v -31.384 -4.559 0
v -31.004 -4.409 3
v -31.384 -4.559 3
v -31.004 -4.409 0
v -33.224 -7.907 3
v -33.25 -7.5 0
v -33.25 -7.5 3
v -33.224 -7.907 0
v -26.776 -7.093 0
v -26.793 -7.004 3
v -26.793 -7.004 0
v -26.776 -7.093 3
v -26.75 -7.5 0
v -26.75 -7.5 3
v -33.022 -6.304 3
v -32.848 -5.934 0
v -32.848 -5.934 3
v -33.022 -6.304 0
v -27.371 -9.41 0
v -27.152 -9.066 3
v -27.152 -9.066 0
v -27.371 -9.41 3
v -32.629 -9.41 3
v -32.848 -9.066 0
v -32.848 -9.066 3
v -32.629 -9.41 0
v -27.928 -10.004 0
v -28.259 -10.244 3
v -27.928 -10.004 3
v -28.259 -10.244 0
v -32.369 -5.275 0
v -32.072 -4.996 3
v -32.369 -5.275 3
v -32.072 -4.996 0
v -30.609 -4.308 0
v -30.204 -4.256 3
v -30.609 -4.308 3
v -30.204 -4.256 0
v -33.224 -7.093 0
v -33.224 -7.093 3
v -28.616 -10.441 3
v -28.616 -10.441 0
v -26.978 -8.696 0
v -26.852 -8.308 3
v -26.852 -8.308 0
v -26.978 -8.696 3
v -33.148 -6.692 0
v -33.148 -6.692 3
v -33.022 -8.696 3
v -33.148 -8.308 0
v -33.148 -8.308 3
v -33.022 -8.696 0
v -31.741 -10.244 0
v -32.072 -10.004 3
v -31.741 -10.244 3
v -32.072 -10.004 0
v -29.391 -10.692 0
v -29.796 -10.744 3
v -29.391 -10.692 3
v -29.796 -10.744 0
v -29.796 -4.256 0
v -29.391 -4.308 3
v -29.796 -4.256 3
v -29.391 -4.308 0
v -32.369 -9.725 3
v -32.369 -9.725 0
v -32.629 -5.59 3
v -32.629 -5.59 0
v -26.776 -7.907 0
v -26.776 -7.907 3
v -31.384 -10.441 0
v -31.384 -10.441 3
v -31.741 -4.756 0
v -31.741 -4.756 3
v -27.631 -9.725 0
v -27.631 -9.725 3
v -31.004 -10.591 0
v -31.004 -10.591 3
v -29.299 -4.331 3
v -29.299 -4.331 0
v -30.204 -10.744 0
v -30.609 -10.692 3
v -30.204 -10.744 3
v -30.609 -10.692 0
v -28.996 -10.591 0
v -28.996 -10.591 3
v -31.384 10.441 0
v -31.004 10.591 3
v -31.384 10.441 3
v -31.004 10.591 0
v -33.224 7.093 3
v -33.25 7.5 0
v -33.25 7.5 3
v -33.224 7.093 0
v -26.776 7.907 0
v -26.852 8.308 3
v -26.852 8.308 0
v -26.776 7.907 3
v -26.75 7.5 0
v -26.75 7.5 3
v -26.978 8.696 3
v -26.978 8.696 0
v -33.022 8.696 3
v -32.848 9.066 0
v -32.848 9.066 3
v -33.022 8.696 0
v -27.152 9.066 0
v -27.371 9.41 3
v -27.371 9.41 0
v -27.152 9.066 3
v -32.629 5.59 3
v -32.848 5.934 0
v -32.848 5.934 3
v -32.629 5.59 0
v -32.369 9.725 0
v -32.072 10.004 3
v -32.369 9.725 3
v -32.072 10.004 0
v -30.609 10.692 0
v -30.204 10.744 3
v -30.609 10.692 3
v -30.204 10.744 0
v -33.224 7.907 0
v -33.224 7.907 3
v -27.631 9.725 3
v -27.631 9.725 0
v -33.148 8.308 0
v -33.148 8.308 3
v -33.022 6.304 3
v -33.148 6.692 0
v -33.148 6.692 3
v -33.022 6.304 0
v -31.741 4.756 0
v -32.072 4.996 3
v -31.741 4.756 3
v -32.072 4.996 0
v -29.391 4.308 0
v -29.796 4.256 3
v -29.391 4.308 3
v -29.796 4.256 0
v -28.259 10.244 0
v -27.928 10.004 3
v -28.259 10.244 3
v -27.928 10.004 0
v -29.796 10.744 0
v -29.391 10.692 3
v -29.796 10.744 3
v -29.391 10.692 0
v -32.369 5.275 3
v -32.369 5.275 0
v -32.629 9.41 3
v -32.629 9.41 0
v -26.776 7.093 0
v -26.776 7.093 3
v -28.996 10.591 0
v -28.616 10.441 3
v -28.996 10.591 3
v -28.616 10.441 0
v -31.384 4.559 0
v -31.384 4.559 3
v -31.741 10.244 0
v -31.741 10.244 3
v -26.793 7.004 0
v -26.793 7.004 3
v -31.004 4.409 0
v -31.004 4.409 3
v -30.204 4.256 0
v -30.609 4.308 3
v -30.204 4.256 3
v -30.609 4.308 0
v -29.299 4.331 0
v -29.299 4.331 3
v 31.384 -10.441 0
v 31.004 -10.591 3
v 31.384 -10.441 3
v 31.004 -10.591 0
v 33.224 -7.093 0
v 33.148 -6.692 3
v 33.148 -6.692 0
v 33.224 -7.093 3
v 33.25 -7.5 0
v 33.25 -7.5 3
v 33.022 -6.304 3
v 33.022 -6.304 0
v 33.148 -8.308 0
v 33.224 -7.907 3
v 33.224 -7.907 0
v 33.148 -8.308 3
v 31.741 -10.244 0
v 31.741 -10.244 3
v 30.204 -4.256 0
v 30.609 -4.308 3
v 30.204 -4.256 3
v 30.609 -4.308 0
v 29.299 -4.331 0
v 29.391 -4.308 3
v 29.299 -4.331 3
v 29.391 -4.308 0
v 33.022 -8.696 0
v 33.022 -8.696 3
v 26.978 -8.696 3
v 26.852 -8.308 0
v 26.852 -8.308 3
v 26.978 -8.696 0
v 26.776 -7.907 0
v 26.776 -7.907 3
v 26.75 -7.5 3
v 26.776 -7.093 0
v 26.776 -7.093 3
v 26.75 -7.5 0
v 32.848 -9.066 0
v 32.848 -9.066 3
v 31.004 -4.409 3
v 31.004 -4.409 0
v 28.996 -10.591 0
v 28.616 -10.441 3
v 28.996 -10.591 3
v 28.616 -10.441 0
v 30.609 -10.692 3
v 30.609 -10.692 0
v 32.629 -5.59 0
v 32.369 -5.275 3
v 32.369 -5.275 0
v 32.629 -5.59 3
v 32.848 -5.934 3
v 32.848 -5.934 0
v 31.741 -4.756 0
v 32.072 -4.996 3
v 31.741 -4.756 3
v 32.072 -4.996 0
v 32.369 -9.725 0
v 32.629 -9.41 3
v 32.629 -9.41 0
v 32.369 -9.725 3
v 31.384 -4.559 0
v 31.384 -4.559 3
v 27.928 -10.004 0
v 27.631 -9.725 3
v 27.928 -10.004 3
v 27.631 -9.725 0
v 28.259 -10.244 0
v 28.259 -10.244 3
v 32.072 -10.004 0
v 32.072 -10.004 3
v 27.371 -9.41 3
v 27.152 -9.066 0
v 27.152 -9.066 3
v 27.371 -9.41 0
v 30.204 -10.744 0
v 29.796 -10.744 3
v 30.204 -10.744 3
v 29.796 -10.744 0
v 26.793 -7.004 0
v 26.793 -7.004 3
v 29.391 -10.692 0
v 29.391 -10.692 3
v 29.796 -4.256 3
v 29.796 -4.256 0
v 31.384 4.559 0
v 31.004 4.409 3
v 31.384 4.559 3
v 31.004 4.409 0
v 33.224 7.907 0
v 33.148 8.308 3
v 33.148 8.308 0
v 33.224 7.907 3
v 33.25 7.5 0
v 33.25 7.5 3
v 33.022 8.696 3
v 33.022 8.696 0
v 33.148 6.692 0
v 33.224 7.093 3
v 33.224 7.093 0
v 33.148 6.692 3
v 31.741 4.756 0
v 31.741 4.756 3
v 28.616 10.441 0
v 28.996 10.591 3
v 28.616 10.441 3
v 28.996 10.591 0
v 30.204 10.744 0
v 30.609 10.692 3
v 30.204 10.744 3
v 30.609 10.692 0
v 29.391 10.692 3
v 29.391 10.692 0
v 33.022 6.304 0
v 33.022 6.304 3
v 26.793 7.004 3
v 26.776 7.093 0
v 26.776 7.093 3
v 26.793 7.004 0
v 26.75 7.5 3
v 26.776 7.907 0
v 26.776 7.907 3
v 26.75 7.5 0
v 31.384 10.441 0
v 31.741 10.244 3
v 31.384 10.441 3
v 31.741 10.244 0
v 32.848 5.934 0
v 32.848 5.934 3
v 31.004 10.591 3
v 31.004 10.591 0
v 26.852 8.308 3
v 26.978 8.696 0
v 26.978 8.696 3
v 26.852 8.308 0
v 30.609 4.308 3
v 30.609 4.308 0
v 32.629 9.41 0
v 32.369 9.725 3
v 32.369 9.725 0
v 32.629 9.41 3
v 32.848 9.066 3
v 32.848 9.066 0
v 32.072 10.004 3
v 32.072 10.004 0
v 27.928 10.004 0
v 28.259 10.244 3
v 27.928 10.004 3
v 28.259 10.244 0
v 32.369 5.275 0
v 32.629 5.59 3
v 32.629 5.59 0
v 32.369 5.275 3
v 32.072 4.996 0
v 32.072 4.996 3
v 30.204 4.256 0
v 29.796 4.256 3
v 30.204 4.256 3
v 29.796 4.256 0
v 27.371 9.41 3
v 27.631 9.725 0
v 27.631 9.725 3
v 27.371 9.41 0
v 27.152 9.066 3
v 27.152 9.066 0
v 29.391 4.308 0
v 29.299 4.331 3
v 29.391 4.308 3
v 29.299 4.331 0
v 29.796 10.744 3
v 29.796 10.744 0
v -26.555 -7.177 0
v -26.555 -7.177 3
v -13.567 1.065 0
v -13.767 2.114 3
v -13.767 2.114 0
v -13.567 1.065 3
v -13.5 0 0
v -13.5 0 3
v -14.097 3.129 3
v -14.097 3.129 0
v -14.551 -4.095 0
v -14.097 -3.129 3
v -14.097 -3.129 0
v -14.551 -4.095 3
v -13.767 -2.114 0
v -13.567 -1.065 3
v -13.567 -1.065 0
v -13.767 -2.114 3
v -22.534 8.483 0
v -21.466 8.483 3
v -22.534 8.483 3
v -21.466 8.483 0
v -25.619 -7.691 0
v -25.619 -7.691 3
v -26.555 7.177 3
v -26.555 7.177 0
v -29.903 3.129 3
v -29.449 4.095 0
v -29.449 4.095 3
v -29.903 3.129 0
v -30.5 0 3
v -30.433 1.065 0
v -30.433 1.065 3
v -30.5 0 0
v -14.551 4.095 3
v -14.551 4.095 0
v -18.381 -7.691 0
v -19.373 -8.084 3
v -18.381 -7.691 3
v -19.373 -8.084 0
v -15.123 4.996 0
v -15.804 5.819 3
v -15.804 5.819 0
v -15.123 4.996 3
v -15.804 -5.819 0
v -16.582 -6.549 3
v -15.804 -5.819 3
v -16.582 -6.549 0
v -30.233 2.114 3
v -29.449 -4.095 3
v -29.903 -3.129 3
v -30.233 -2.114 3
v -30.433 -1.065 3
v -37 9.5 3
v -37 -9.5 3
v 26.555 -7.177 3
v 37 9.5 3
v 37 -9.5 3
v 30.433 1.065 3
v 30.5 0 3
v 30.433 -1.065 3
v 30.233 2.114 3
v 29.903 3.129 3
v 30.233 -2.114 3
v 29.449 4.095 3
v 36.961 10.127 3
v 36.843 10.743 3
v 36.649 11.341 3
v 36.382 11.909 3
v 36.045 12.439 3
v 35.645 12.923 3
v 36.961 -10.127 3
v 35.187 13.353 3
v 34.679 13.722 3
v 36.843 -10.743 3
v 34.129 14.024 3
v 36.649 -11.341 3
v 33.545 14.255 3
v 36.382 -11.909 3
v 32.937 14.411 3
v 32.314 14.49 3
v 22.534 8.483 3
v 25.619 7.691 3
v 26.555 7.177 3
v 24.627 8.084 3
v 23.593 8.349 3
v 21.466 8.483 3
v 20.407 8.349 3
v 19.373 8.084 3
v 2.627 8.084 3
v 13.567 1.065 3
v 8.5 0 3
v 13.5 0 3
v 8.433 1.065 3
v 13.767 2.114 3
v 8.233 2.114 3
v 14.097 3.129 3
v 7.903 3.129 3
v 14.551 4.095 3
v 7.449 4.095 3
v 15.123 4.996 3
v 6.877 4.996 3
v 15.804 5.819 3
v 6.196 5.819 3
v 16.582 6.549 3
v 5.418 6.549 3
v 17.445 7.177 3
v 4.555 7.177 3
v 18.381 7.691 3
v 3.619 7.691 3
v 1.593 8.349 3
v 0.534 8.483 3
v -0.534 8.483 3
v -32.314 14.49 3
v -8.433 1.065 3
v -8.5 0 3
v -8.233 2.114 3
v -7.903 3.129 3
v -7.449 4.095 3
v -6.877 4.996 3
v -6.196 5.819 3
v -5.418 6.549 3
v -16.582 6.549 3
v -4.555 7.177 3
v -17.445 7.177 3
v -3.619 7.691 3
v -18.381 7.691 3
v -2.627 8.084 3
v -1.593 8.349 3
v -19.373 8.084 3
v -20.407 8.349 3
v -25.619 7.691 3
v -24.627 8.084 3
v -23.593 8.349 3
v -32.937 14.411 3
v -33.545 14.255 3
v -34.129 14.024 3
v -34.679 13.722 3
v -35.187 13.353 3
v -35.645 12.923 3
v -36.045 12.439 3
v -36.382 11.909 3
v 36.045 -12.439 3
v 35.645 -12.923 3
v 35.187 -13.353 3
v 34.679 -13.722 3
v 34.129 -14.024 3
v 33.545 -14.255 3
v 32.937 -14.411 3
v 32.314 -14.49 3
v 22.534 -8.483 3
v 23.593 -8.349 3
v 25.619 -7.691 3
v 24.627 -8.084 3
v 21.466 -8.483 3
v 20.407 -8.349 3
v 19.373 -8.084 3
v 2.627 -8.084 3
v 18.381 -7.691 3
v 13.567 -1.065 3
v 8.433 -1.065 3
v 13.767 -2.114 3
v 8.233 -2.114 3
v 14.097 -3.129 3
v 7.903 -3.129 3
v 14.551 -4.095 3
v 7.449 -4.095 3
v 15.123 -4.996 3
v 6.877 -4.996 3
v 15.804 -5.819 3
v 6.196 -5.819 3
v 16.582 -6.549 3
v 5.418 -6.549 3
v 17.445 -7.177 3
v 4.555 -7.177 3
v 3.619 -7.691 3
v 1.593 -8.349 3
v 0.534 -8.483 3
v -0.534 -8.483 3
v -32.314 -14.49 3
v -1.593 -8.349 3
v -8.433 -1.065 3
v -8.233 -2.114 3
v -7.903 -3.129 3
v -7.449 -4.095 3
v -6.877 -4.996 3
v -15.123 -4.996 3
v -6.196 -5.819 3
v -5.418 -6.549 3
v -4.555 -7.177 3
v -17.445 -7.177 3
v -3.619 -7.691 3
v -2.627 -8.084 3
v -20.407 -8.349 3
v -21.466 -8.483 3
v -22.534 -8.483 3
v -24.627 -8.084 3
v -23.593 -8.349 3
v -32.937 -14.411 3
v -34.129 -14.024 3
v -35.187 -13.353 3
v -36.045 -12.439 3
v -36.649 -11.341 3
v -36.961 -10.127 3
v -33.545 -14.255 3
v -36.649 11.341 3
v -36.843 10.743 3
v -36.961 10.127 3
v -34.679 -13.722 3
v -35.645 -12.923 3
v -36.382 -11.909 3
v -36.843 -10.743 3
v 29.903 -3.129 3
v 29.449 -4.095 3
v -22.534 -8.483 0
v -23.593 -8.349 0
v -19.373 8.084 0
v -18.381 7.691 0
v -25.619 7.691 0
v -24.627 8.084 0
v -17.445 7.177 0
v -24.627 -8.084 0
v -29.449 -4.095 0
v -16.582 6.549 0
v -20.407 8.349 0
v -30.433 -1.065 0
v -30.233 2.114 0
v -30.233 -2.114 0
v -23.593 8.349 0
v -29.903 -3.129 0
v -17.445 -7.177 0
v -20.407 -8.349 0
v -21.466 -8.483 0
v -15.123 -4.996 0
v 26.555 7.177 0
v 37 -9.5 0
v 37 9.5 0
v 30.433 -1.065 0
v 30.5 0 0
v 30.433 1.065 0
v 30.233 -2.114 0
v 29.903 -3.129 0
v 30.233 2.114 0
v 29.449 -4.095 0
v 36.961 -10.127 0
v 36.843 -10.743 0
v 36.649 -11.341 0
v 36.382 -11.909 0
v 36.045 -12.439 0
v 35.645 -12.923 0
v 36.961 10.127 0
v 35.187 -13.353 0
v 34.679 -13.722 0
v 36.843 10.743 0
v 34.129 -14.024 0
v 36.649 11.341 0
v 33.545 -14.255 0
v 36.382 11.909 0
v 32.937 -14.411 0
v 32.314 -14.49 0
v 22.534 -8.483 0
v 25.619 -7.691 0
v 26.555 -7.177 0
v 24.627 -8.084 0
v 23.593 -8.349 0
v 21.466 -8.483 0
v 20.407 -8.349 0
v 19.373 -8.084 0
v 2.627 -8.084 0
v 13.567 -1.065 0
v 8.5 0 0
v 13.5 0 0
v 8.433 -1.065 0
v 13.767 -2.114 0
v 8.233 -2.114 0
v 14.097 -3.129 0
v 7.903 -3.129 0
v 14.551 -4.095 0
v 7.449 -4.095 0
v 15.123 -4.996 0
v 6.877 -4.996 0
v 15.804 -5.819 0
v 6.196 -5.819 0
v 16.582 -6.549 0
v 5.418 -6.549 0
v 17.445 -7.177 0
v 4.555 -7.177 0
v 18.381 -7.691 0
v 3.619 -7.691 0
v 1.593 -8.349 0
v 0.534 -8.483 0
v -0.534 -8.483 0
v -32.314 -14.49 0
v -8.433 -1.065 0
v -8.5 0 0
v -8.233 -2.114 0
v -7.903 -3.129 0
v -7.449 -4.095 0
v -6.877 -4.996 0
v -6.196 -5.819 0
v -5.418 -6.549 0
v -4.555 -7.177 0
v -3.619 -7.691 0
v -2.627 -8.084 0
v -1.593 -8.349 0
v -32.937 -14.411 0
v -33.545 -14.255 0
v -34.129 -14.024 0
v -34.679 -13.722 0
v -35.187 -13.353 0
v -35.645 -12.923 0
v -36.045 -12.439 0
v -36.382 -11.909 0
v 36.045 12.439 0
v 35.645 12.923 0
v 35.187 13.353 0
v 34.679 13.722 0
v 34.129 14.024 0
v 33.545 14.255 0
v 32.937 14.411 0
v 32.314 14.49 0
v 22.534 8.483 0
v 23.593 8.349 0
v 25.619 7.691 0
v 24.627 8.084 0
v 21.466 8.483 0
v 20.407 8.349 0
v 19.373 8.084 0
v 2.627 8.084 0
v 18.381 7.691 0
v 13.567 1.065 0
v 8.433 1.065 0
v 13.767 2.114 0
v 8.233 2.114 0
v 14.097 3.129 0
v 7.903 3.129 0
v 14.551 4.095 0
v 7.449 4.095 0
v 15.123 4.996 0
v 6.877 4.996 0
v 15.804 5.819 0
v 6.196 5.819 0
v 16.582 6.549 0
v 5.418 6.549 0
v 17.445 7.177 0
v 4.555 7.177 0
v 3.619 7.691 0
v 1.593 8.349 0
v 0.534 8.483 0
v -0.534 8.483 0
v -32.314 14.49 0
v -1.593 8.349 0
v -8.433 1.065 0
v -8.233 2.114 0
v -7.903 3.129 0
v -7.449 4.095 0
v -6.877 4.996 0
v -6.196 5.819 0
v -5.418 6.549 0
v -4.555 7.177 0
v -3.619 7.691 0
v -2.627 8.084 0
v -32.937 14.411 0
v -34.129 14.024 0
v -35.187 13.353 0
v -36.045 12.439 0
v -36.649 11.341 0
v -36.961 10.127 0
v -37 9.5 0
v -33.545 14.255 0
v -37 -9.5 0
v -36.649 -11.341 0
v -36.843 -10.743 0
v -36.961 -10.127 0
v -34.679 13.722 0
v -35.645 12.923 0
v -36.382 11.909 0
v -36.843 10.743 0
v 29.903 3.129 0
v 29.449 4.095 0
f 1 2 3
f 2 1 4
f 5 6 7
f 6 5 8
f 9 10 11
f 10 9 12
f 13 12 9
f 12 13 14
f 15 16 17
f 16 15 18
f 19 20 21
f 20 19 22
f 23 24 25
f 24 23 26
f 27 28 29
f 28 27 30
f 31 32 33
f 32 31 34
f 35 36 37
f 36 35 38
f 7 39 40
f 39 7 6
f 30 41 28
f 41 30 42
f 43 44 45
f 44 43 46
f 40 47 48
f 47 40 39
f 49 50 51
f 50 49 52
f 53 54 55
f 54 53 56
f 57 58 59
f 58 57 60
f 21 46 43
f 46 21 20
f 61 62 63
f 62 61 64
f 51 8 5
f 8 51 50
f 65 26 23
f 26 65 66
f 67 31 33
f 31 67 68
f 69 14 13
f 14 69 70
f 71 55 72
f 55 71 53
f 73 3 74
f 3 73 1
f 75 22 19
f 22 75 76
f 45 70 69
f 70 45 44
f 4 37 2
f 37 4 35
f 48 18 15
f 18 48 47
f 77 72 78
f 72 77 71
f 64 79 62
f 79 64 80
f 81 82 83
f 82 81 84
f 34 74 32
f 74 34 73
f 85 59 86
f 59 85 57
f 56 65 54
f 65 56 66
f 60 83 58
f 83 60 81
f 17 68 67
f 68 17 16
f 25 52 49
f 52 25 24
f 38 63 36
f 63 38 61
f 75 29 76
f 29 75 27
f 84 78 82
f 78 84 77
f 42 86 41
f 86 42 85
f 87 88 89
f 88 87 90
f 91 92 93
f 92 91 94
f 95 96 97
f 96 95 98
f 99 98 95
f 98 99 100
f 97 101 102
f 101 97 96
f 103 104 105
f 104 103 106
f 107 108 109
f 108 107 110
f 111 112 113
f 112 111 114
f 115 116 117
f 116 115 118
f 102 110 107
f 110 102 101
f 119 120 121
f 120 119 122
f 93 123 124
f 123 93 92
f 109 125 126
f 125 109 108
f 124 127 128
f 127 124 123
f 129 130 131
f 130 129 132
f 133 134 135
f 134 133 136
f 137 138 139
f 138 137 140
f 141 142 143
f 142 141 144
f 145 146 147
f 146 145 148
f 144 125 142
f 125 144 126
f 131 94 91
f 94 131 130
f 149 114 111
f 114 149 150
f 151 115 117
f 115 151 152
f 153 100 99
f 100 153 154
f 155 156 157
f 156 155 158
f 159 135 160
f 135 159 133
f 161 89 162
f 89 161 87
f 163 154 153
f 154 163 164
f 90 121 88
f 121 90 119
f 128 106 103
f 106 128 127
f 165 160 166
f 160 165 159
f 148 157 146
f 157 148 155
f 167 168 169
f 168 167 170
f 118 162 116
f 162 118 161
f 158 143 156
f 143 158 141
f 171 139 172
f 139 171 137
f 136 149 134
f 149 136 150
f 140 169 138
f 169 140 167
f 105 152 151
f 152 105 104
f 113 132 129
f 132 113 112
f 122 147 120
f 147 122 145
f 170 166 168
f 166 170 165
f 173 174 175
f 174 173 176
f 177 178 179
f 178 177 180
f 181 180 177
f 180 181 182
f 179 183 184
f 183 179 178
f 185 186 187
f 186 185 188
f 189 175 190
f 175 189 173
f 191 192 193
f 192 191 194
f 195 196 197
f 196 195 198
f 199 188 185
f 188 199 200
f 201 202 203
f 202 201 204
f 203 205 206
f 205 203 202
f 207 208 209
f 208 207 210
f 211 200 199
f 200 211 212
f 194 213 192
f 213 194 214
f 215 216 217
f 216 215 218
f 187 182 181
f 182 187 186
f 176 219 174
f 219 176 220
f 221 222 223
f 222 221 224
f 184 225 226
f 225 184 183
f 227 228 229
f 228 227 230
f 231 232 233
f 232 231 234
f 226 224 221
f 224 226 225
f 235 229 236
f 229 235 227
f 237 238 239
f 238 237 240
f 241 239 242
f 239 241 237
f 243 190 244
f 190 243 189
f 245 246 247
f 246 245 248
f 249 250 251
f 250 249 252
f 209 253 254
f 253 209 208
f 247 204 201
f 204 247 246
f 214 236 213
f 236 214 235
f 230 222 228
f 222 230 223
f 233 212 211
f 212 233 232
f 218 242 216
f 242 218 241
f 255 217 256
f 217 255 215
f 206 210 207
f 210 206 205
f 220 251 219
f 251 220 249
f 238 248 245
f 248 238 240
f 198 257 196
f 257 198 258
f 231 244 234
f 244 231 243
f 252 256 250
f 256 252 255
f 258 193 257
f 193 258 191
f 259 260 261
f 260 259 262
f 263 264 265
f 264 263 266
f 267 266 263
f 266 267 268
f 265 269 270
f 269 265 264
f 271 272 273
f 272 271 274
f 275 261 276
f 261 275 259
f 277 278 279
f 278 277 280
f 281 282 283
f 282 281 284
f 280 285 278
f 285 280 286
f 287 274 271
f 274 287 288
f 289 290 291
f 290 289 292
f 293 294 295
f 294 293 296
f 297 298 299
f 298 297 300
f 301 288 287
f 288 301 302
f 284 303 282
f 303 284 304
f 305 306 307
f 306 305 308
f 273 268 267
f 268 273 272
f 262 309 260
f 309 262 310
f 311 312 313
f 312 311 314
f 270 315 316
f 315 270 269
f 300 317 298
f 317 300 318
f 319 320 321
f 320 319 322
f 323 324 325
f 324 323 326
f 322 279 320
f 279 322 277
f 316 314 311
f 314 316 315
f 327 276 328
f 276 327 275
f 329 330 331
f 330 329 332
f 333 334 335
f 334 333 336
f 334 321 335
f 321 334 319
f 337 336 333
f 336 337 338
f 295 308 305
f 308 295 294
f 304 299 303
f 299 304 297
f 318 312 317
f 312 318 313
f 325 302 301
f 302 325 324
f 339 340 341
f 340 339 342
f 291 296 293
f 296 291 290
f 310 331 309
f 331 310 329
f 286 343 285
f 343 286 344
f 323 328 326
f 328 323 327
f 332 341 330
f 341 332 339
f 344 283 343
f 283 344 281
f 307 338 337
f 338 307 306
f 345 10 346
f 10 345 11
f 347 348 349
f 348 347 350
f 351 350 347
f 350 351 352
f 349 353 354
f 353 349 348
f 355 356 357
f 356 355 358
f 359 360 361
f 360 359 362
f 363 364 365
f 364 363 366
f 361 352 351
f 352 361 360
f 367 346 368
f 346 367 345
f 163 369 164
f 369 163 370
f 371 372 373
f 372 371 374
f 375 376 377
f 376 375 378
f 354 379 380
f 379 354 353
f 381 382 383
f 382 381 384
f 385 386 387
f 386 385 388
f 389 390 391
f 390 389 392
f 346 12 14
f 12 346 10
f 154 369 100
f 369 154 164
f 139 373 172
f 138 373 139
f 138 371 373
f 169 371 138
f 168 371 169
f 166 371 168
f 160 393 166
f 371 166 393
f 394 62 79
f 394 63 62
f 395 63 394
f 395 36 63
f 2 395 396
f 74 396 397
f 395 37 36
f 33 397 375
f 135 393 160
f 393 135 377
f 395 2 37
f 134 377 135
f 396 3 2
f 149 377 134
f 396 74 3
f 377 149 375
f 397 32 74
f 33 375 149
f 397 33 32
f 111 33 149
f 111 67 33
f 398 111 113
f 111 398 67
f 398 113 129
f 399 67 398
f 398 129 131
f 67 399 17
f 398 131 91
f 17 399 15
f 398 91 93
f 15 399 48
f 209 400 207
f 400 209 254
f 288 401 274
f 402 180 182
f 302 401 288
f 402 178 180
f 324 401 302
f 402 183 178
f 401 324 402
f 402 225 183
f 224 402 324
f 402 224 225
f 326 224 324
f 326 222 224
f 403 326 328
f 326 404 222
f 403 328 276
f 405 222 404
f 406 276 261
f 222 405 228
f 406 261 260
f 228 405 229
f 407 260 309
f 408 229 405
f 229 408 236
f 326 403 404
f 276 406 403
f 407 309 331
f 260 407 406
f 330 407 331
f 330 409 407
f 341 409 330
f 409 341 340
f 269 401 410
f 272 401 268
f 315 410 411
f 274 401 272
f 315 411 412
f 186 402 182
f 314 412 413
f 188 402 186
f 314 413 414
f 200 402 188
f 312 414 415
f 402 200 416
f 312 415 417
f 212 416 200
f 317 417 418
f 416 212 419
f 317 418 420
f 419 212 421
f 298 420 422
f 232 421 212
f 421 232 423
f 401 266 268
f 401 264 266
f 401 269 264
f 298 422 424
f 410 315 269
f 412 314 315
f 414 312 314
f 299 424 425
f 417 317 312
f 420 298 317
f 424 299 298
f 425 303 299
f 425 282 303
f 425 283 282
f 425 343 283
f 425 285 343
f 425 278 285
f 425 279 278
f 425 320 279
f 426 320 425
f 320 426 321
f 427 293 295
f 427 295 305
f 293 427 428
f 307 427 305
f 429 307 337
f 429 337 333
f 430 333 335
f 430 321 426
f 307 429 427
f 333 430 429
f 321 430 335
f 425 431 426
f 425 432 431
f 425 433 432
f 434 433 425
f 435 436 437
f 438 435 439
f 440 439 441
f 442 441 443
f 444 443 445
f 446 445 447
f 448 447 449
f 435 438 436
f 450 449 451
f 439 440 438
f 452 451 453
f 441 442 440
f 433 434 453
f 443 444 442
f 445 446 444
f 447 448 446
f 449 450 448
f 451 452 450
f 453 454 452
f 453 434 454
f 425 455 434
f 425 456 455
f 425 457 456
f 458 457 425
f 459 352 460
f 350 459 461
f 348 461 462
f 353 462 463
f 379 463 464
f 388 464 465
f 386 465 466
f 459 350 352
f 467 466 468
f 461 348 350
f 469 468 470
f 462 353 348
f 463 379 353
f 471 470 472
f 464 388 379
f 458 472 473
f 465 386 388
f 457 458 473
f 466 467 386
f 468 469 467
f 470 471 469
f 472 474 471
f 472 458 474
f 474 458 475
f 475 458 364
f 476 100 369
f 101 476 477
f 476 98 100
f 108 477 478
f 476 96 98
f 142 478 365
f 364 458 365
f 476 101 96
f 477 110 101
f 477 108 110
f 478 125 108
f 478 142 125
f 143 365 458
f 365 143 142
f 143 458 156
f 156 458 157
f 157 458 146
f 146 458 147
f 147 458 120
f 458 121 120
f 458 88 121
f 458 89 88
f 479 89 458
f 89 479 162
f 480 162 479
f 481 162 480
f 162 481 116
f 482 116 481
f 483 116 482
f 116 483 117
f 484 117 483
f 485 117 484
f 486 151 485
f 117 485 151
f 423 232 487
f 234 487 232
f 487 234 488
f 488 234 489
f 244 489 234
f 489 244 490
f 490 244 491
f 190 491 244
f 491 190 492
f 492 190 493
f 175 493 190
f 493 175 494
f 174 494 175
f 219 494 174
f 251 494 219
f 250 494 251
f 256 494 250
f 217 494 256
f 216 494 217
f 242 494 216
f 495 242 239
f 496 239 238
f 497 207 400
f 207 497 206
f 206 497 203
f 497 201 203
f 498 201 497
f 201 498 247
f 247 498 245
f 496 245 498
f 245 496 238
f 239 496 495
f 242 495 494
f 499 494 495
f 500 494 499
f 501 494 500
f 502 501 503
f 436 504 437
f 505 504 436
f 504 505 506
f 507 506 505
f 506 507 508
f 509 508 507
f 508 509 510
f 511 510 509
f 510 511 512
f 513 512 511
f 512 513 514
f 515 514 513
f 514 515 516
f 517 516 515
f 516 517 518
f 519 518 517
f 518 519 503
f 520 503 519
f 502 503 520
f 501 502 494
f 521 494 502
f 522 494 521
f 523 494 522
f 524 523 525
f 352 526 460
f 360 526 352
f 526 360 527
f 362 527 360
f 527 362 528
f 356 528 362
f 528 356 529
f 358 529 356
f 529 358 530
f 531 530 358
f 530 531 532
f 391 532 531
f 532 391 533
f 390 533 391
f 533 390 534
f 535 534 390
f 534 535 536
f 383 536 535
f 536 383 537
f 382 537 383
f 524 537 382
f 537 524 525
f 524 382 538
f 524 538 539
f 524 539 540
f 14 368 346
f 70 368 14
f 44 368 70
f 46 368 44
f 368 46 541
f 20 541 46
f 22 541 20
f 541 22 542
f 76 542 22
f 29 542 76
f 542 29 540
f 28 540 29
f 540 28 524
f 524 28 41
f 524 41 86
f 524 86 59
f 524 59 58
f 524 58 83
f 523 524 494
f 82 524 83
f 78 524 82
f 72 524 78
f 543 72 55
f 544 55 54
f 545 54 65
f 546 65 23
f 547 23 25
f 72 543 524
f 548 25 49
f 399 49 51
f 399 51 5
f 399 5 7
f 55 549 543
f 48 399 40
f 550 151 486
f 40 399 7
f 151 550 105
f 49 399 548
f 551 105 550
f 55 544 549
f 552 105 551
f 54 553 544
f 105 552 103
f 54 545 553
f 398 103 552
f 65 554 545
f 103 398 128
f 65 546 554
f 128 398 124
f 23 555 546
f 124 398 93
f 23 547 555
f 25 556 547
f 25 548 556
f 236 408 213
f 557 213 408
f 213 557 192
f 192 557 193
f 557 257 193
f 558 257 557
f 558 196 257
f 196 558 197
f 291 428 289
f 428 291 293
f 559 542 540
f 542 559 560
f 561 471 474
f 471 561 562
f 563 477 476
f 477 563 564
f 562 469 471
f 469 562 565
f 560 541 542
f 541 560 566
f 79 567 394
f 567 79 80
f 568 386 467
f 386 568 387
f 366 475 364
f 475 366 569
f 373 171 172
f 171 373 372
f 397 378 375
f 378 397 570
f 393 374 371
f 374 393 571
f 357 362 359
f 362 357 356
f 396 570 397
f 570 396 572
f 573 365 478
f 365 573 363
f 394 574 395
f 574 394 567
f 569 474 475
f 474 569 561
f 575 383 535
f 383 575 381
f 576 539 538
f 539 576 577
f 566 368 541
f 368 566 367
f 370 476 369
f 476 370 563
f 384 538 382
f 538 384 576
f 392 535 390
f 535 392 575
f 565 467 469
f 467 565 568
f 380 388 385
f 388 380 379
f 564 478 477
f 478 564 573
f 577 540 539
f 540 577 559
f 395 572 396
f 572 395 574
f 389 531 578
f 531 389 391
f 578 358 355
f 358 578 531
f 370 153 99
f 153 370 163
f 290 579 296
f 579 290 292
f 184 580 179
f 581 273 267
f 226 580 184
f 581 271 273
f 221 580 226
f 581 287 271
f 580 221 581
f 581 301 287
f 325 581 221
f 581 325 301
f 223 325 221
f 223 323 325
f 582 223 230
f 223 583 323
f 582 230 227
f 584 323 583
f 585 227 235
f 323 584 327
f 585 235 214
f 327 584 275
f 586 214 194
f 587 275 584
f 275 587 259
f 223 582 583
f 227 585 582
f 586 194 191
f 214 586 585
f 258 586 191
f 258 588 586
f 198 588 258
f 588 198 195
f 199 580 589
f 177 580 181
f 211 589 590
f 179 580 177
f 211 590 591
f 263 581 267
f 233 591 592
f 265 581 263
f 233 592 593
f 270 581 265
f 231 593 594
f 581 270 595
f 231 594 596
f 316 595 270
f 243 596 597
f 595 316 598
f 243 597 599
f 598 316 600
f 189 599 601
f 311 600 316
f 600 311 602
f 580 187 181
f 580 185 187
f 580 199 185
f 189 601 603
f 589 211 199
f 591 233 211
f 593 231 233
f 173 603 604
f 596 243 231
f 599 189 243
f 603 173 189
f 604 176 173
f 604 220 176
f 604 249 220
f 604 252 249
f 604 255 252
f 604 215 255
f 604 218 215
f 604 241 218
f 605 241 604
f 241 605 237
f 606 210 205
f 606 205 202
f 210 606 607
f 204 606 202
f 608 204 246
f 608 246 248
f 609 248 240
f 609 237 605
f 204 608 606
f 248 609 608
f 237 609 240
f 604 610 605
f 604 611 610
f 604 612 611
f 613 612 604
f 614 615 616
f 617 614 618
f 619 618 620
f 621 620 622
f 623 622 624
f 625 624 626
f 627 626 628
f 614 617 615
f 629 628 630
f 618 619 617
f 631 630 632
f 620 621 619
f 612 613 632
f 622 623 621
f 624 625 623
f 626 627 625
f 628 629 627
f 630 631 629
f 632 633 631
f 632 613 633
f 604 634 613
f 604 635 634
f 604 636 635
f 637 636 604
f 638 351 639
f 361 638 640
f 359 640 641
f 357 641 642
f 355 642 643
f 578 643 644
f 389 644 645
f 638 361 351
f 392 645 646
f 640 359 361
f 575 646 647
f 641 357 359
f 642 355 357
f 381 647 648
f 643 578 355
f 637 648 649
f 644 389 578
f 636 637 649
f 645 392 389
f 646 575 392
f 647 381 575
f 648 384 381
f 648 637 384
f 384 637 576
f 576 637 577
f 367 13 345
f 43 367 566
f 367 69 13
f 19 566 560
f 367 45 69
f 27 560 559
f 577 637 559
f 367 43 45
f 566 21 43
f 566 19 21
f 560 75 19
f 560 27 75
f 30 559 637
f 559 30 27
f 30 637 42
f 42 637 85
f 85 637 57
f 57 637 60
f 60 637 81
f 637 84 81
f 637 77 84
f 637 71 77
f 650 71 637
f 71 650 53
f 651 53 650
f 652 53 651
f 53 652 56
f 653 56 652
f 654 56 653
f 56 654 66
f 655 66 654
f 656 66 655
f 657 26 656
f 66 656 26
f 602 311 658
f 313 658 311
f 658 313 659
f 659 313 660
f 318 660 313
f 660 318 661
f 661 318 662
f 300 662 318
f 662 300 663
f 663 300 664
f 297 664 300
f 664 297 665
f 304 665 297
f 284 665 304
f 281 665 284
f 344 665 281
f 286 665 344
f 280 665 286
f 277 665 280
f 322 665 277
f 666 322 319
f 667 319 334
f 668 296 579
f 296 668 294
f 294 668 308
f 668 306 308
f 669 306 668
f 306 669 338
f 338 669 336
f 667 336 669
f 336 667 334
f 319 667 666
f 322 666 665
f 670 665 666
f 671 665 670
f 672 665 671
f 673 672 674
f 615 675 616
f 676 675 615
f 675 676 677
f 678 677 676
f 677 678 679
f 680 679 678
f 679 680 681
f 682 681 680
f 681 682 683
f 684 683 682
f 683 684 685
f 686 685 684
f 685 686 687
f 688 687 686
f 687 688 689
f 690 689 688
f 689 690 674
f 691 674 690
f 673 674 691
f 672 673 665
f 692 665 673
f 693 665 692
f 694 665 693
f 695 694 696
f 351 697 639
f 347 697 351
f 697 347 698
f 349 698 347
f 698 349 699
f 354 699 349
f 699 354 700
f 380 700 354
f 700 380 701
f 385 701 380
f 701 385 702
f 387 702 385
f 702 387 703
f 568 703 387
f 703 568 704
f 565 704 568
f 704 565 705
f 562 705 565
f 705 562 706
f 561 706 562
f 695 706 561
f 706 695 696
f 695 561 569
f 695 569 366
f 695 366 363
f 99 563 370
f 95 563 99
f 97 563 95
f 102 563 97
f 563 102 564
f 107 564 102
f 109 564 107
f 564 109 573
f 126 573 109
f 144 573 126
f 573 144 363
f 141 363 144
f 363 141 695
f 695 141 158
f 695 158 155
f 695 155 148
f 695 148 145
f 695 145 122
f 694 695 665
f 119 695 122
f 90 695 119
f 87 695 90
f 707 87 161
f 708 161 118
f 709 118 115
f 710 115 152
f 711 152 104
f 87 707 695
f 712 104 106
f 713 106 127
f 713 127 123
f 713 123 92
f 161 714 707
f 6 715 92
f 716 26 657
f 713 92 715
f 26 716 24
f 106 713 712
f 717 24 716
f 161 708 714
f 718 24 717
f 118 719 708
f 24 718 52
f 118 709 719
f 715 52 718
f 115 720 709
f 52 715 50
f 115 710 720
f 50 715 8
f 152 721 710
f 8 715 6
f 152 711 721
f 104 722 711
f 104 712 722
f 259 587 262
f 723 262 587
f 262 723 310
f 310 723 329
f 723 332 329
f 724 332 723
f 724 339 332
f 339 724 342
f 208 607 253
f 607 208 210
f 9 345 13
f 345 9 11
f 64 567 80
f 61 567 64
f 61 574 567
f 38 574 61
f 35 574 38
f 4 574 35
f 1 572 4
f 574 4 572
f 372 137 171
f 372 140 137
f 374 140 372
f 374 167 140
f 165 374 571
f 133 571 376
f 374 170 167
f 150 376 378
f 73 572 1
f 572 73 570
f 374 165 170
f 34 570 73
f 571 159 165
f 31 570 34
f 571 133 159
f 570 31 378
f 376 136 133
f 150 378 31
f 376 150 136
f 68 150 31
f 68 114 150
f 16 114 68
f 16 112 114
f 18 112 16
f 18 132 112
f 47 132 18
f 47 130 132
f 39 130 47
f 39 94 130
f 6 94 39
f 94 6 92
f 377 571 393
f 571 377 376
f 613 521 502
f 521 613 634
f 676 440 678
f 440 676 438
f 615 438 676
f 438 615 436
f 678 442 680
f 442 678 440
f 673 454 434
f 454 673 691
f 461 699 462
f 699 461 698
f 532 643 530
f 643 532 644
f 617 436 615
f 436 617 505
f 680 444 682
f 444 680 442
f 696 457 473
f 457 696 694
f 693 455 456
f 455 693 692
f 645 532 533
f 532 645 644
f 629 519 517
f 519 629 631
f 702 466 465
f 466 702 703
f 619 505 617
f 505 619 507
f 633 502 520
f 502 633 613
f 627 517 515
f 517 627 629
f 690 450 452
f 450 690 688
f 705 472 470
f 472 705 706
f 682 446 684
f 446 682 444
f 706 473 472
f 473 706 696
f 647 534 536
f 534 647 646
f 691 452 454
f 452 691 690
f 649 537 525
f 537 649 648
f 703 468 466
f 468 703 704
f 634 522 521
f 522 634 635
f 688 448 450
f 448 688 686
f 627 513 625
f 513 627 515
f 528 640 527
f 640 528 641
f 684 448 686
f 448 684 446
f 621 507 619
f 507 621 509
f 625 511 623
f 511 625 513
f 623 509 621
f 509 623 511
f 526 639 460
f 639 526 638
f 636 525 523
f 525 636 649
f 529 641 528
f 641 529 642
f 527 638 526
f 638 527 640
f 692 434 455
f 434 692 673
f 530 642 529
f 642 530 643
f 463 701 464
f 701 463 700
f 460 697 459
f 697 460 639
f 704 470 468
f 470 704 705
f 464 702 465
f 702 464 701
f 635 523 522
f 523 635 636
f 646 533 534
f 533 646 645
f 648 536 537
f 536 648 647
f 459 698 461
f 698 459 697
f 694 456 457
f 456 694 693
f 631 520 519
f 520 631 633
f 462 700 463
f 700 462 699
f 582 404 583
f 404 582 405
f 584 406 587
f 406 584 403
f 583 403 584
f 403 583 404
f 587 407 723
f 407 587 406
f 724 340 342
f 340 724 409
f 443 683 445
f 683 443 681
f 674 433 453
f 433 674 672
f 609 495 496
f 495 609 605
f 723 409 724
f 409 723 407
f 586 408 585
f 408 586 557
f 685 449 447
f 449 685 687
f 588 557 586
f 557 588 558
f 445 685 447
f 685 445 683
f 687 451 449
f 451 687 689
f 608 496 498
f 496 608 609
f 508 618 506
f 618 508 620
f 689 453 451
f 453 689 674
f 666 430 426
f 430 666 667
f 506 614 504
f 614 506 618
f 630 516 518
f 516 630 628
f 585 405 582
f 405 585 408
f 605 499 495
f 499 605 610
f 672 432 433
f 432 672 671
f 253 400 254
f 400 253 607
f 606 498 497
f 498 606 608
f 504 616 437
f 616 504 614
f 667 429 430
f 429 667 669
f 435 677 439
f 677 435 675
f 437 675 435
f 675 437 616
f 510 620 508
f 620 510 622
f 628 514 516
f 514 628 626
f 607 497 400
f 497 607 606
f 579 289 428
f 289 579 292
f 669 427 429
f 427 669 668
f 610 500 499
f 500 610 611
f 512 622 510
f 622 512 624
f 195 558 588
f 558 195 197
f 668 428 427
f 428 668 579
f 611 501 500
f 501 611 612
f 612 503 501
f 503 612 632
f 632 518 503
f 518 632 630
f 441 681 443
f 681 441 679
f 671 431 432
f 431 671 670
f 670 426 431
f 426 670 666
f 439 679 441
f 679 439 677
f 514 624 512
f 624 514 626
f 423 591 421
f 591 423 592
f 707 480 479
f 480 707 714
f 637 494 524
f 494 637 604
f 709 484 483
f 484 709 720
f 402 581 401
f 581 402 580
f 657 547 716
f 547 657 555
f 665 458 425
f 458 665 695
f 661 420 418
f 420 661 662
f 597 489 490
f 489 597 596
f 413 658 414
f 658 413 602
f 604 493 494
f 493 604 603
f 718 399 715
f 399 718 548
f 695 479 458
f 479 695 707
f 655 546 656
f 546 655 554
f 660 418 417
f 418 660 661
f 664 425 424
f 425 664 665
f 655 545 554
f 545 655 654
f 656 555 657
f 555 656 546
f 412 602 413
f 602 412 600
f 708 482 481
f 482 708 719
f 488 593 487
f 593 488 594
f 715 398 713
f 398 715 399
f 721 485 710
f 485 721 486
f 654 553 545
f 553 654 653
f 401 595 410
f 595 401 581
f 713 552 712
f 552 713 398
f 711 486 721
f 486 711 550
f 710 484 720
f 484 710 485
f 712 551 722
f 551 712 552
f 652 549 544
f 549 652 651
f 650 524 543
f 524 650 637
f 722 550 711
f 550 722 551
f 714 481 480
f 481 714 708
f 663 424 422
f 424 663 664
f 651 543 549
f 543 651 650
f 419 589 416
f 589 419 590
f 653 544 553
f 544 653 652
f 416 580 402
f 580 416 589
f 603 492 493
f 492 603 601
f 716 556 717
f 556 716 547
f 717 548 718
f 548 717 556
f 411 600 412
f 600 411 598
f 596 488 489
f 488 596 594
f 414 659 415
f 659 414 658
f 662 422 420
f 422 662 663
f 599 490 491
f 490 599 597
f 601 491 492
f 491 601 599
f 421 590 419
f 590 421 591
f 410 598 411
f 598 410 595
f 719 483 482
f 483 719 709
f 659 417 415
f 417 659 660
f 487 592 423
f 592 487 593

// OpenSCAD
$fn = 50;


difference() {
	union() {
		hull() {
			translate(v = [-32.0000000000, 9.5000000000, 0]) {
				cylinder(h = 3, r = 5);
			}
			translate(v = [32.0000000000, 9.5000000000, 0]) {
				cylinder(h = 3, r = 5);
			}
			translate(v = [-32.0000000000, -9.5000000000, 0]) {
				cylinder(h = 3, r = 5);
			}
			translate(v = [32.0000000000, -9.5000000000, 0]) {
				cylinder(h = 3, r = 5);
			}
		}
	}
	union() {
		#translate(v = [-30.0000000000, -7.5000000000, -100.0000000000]) {
			cylinder(h = 200, r = 3.2500000000);
		}
		#translate(v = [-30.0000000000, 7.5000000000, -100.0000000000]) {
			cylinder(h = 200, r = 3.2500000000);
		}
		#translate(v = [30.0000000000, -7.5000000000, -100.0000000000]) {
			cylinder(h = 200, r = 3.2500000000);
		}
		#translate(v = [30.0000000000, 7.5000000000, -100.0000000000]) {
			cylinder(h = 200, r = 3.2500000000);
		}
		#translate(v = [-22.0000000000, 0, 0]) {
			cylinder(h = 3, r = 8.5000000000);
		}
		#cylinder(h = 3, r = 8.5000000000);
		#translate(v = [22.0000000000, 0, 0]) {
			cylinder(h = 3, r = 8.5000000000);
		}
	}
}
